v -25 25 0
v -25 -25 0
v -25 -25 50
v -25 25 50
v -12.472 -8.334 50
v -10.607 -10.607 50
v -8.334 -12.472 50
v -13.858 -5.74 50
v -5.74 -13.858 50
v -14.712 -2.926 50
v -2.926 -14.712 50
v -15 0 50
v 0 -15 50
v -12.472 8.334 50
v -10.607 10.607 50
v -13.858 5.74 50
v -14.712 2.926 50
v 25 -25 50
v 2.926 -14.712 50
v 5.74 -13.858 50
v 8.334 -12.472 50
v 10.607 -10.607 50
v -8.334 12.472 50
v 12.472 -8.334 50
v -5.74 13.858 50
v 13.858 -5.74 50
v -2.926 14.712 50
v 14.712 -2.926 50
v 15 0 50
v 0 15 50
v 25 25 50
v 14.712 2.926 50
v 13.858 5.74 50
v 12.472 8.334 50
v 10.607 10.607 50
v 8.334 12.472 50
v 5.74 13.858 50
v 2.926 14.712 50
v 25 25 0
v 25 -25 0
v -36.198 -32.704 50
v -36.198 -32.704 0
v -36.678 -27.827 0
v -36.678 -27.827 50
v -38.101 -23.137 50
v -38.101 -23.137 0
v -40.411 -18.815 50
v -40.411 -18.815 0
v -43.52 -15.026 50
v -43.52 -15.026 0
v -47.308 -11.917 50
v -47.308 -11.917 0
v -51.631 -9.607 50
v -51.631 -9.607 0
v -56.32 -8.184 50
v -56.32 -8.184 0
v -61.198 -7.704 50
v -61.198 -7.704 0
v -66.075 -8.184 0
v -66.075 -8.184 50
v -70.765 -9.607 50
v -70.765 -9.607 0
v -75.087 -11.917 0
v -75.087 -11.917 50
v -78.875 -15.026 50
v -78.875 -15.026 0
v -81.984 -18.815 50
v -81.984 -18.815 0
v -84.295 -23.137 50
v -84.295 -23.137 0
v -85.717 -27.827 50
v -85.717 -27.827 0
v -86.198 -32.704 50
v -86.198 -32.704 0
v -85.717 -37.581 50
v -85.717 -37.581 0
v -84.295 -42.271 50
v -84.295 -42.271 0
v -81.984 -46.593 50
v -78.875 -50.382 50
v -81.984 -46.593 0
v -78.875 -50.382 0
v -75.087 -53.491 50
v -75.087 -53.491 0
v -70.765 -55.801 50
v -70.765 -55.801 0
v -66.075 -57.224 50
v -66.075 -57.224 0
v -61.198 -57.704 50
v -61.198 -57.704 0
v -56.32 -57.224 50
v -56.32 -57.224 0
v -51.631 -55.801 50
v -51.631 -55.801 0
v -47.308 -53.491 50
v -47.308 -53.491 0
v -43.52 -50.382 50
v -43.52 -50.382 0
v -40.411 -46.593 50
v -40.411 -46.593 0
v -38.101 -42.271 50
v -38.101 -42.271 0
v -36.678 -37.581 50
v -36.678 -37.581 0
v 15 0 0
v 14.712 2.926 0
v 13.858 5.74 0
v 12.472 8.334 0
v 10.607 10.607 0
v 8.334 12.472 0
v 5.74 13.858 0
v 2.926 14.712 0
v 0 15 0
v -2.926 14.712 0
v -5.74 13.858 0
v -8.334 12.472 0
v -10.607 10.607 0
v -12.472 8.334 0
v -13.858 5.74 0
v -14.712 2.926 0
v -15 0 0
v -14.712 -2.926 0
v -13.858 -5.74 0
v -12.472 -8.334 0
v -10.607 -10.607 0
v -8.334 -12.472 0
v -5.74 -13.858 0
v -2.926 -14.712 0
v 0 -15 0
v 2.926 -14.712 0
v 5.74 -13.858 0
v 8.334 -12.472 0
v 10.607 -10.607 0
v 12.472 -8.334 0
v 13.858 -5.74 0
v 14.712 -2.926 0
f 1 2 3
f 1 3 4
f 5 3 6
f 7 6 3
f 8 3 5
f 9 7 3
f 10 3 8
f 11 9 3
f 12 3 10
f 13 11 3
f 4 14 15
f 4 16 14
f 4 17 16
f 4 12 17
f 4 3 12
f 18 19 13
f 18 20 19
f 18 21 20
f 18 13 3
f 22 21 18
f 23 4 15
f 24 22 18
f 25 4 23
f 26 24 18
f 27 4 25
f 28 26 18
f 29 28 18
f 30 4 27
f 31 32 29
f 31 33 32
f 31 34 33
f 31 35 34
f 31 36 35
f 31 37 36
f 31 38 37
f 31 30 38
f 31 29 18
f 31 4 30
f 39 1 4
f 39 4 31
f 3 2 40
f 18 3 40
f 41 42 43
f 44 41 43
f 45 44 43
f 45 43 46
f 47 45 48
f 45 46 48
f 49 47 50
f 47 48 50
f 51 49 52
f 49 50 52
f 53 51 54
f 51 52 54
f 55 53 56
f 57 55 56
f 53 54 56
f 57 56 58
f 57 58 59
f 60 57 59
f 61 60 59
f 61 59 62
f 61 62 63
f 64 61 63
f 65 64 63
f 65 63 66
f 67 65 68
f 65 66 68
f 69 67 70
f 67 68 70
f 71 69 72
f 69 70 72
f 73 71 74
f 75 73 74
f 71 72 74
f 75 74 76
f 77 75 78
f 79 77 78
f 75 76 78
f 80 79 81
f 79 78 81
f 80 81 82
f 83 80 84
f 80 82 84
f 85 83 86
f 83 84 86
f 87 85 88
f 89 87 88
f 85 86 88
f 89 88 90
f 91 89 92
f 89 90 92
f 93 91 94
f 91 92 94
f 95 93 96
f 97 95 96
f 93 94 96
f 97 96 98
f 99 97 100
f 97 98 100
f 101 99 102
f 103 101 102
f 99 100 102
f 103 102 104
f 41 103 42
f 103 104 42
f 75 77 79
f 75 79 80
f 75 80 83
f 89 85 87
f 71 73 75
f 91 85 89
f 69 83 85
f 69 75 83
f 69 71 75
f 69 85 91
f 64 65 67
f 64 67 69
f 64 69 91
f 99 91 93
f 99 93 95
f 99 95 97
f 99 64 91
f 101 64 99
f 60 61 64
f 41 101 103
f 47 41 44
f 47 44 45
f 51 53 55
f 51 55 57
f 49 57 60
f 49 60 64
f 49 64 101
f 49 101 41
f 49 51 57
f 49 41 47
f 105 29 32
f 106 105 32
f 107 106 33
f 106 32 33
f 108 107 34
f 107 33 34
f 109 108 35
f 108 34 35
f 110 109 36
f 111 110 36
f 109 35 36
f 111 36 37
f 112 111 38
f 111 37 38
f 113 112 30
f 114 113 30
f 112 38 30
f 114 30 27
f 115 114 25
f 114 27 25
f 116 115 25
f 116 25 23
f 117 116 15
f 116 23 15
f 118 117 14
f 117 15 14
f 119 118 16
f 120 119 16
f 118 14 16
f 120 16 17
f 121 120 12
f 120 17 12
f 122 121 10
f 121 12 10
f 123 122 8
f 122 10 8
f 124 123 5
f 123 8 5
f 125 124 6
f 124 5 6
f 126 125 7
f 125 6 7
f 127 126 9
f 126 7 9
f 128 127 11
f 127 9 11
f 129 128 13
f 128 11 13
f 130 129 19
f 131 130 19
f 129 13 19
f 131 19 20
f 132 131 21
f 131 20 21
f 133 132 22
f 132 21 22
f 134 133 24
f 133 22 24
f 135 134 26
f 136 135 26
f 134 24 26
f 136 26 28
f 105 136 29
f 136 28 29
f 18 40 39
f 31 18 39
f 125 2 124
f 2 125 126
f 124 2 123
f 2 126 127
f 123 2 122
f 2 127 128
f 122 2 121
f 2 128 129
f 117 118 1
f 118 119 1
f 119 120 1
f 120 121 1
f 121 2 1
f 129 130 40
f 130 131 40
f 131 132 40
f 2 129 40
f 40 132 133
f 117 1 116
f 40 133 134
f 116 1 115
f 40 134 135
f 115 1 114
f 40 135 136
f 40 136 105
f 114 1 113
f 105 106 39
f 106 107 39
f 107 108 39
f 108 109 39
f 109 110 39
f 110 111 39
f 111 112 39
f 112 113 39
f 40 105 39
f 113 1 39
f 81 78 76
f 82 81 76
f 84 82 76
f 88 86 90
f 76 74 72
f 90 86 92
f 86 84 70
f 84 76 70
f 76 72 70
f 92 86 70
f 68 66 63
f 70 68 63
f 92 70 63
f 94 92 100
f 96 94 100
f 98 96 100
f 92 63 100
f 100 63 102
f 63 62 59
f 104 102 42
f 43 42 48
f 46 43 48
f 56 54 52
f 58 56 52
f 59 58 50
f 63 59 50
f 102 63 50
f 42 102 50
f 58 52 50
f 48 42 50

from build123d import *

# Parameters (mm, degrees)
F0_W     = 50
F0_H     = 50
F1_DEPTH = 50
F2_R     = 15
F3_DEPTH = 50
F4_R     = 25
F5_DEPTH = 50


with BuildPart() as f1:
    # F0 (on Top) → F1 (new body)
    with BuildSketch(Plane.XY):
        Rectangle(F0_W, F0_H)
    extrude(amount=F1_DEPTH)

    # F2 (on face) → F3 (cut)
    with BuildSketch(Plane.XY.offset(50)):
        Circle(F2_R)
    extrude(amount=-F3_DEPTH, mode=Mode.SUBTRACT)


with BuildPart() as f5:
    # F4 (on Top) → F5 (new body)
    with BuildSketch(Plane.XY):
        with Locations((-61.197706, -32.704029)):
            Circle(F4_R)
    extrude(amount=F5_DEPTH)


solid = Compound([f1.part, f5.part])
